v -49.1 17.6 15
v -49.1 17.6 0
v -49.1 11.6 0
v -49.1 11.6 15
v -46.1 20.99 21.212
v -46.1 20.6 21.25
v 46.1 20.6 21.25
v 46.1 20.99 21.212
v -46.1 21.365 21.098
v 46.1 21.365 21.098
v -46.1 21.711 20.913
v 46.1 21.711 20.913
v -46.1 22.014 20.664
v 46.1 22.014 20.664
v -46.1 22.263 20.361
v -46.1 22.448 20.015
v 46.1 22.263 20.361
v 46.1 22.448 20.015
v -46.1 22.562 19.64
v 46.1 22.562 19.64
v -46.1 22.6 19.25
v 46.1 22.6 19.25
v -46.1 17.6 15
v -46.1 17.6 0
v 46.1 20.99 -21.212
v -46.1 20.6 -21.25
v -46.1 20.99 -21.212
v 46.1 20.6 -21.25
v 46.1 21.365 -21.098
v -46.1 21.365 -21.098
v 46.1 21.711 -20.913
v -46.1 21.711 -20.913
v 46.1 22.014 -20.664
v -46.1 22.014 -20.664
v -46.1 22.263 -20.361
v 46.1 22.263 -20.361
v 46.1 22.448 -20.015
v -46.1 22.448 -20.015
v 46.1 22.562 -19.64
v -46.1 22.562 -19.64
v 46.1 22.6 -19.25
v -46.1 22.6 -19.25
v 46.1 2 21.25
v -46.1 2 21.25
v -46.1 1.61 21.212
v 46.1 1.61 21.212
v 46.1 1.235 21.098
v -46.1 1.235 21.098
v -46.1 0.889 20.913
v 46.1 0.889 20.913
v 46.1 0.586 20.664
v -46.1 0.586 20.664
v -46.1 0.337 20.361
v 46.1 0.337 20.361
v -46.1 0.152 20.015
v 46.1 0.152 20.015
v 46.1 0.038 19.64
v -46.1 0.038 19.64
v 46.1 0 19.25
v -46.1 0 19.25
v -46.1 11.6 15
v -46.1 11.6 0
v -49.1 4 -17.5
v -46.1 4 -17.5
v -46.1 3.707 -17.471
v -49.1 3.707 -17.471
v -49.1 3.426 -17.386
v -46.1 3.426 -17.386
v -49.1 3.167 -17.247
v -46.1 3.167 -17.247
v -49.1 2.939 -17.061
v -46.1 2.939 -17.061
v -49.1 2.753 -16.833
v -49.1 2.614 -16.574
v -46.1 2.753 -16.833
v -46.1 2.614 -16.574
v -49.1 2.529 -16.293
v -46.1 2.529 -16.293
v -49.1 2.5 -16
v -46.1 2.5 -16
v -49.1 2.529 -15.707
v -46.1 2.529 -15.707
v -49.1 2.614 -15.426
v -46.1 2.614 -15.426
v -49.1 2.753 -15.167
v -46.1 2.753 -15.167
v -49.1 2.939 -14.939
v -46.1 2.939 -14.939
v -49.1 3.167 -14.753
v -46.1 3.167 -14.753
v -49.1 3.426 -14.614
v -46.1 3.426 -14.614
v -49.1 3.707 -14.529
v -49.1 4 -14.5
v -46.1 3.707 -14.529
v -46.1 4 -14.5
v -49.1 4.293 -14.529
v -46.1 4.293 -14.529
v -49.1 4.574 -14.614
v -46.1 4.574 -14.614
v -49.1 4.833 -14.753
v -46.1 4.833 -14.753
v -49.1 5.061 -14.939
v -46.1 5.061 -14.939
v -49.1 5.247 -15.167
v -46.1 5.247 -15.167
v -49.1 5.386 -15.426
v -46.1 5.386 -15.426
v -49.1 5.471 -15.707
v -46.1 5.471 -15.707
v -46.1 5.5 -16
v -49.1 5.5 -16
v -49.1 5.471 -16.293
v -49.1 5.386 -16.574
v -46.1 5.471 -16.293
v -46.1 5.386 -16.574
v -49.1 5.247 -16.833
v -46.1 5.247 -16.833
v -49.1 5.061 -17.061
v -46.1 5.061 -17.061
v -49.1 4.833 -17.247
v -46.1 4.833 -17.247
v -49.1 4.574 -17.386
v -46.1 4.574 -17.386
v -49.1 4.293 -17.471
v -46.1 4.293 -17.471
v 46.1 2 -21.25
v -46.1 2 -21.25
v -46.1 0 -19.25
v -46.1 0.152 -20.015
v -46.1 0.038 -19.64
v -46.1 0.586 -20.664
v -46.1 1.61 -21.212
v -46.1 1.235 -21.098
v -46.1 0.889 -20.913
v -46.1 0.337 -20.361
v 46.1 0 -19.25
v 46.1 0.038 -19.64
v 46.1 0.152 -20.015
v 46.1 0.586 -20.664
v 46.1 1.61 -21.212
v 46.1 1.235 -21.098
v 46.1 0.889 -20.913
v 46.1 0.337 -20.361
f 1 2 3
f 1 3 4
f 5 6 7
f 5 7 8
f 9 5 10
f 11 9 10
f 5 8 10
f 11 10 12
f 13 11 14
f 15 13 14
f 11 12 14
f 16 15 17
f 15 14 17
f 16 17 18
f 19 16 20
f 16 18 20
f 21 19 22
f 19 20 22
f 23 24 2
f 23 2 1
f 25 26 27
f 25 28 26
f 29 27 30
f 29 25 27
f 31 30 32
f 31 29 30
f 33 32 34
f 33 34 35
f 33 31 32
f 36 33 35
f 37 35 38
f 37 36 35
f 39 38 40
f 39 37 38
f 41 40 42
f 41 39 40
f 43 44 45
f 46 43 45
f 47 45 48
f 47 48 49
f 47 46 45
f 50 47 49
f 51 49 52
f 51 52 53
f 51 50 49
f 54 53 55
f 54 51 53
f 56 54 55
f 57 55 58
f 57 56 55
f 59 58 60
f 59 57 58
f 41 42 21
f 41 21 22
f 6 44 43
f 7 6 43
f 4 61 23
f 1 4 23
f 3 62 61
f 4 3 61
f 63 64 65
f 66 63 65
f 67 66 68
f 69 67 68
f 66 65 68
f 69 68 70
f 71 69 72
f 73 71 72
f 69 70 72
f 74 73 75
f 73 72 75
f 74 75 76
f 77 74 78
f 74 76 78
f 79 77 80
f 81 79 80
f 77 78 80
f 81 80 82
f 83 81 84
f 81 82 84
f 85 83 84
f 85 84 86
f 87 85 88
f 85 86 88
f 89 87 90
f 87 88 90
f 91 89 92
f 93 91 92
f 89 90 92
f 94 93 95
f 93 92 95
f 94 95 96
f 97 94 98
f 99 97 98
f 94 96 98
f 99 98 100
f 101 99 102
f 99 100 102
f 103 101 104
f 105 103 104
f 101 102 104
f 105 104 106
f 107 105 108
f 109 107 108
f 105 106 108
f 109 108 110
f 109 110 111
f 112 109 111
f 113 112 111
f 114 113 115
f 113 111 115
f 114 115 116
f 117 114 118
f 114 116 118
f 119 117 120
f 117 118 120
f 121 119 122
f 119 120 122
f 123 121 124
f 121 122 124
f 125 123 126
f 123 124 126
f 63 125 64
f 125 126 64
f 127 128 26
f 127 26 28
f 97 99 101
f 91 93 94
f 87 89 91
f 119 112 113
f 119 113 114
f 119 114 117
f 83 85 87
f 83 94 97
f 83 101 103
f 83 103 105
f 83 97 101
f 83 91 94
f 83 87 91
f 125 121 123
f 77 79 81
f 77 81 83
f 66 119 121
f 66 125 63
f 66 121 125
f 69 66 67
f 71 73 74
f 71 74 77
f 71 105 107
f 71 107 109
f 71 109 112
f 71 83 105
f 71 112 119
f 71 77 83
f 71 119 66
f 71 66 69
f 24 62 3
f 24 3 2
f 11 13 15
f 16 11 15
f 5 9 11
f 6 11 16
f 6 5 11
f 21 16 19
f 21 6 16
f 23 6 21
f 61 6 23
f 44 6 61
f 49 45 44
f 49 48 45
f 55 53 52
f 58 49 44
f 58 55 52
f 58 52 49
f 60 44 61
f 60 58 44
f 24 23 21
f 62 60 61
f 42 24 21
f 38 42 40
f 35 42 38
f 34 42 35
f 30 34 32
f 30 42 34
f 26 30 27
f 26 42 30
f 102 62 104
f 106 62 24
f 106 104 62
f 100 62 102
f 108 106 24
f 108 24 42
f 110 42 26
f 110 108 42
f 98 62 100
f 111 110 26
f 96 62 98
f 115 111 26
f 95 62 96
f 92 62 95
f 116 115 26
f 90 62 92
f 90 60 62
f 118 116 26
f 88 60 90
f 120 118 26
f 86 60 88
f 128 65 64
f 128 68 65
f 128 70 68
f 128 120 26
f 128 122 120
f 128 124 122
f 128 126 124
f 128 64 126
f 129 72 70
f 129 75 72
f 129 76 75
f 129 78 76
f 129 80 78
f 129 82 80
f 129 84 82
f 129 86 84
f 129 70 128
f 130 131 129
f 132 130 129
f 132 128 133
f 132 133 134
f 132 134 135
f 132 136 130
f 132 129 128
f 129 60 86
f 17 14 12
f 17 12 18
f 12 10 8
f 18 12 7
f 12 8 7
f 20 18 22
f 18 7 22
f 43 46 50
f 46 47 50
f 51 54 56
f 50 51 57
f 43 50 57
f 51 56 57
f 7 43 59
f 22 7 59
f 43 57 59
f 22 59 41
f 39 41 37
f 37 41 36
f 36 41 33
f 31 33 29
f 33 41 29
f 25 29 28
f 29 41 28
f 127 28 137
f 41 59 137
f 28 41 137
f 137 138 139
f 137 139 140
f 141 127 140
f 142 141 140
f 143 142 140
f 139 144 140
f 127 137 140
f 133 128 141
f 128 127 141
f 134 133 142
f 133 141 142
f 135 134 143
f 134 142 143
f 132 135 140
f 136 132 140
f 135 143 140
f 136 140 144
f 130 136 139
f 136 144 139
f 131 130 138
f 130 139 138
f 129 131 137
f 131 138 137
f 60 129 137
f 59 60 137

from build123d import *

# Parameters (mm, degrees)
SKETCH_1_W      = 92.2
SKETCH_1_H      = 42.5
EXTRUDE_1_DEPTH = 22.6
FILLET_1_R      = 2
SKETCH_6_R      = 1.5
SKETCH_6_W      = 15
SKETCH_6_H      = 6
EXTRUDE_5_DEPTH = 3


with BuildPart() as part:
    # 草图1 → 凸台-拉伸1 (new body)
    with BuildSketch(Plane(origin=(0, 0, 0), x_dir=(1, 0, 0), z_dir=(0, 1, 0))):
        Rectangle(SKETCH_1_W, SKETCH_1_H)
    extrude(amount=EXTRUDE_1_DEPTH)

    # 圆角1
    fillet_1_edges = [part.edges().sort_by_distance(p)[0] for p in [
        (0, 22.6, 21.25),
        (0, 0, 21.25),
        (0, 0, -21.25),
        (0, 22.6, -21.25),
    ]]
    fillet(fillet_1_edges, radius=FILLET_1_R)

    # 草图6 → 凸台-拉伸5 (add)
    with BuildSketch(Plane.ZY.offset(46.1)):
        with Locations(Location((-16, 4, 0), (0, 0, 180))):
            Circle(SKETCH_6_R)
        with Locations((7.5, 14.6)):
            Rectangle(SKETCH_6_W, SKETCH_6_H)
    extrude(amount=EXTRUDE_5_DEPTH)


solid = part.part
